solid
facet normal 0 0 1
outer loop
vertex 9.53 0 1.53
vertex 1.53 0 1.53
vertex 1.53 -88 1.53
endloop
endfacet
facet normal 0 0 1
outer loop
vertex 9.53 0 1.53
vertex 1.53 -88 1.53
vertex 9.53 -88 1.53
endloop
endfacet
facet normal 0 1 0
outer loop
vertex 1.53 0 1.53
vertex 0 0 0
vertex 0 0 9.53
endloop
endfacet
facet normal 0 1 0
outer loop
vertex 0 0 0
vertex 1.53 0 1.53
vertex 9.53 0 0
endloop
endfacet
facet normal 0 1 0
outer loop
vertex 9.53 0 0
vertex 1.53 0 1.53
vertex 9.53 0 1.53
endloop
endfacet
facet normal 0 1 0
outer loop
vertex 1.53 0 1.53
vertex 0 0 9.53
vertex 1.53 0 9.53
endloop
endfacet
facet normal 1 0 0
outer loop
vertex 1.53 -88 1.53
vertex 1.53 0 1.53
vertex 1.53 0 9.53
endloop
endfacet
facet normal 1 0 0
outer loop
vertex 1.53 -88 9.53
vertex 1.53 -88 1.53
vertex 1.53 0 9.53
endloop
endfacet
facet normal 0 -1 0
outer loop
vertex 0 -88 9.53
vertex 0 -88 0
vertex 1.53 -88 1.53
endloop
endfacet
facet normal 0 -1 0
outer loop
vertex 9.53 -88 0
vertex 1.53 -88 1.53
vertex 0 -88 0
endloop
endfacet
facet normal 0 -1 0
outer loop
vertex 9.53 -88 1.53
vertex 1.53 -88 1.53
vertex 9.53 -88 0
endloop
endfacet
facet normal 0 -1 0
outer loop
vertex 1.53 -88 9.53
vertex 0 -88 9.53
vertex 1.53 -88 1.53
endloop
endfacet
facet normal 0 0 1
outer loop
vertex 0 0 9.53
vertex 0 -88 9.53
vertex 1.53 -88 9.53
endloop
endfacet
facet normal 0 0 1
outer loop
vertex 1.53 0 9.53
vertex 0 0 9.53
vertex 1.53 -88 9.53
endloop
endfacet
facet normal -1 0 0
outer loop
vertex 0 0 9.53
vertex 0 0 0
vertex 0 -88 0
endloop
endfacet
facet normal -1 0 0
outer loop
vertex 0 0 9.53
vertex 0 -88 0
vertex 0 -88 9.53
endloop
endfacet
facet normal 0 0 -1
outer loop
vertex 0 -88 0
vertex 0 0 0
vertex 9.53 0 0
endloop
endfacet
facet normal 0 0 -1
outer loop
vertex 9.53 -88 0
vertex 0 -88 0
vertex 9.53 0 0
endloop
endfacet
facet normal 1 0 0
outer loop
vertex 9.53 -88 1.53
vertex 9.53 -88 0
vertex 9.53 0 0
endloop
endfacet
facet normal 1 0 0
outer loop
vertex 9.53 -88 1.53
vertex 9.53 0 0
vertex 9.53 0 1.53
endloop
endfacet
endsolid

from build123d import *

# Parameters (mm, degrees)
F0_W     = 9.53
F0_H     = 9.53
F1_DEPTH = 88
F2_T     = -1.53
F3_W     = 8
F3_H     = 1.53
F4_DEPTH = 88.001


with BuildPart() as f1:
    # F0 (on Front) → F1 (new body)
    with BuildSketch(Plane.XZ):
        with Locations((4.765, 4.765)):
            Rectangle(F0_W, F0_H)
    extrude(amount=F1_DEPTH)

    # F2
    f2_openings = [f1.faces().sort_by_distance(p)[0] for p in [
        (9.53, -44, 4.765),
        (4.765, -88, 4.765),
        (4.765, 0, 4.765),
    ]]
    offset(amount=F2_T, openings=f2_openings)

    # F3 (on Front) → F4 (cut, through all)
    with BuildSketch(Plane.XZ):
        with Locations((5.53, 8.765)):
            Rectangle(F3_W, F3_H)
    extrude(amount=F4_DEPTH, mode=Mode.SUBTRACT)


solid = f1.part
